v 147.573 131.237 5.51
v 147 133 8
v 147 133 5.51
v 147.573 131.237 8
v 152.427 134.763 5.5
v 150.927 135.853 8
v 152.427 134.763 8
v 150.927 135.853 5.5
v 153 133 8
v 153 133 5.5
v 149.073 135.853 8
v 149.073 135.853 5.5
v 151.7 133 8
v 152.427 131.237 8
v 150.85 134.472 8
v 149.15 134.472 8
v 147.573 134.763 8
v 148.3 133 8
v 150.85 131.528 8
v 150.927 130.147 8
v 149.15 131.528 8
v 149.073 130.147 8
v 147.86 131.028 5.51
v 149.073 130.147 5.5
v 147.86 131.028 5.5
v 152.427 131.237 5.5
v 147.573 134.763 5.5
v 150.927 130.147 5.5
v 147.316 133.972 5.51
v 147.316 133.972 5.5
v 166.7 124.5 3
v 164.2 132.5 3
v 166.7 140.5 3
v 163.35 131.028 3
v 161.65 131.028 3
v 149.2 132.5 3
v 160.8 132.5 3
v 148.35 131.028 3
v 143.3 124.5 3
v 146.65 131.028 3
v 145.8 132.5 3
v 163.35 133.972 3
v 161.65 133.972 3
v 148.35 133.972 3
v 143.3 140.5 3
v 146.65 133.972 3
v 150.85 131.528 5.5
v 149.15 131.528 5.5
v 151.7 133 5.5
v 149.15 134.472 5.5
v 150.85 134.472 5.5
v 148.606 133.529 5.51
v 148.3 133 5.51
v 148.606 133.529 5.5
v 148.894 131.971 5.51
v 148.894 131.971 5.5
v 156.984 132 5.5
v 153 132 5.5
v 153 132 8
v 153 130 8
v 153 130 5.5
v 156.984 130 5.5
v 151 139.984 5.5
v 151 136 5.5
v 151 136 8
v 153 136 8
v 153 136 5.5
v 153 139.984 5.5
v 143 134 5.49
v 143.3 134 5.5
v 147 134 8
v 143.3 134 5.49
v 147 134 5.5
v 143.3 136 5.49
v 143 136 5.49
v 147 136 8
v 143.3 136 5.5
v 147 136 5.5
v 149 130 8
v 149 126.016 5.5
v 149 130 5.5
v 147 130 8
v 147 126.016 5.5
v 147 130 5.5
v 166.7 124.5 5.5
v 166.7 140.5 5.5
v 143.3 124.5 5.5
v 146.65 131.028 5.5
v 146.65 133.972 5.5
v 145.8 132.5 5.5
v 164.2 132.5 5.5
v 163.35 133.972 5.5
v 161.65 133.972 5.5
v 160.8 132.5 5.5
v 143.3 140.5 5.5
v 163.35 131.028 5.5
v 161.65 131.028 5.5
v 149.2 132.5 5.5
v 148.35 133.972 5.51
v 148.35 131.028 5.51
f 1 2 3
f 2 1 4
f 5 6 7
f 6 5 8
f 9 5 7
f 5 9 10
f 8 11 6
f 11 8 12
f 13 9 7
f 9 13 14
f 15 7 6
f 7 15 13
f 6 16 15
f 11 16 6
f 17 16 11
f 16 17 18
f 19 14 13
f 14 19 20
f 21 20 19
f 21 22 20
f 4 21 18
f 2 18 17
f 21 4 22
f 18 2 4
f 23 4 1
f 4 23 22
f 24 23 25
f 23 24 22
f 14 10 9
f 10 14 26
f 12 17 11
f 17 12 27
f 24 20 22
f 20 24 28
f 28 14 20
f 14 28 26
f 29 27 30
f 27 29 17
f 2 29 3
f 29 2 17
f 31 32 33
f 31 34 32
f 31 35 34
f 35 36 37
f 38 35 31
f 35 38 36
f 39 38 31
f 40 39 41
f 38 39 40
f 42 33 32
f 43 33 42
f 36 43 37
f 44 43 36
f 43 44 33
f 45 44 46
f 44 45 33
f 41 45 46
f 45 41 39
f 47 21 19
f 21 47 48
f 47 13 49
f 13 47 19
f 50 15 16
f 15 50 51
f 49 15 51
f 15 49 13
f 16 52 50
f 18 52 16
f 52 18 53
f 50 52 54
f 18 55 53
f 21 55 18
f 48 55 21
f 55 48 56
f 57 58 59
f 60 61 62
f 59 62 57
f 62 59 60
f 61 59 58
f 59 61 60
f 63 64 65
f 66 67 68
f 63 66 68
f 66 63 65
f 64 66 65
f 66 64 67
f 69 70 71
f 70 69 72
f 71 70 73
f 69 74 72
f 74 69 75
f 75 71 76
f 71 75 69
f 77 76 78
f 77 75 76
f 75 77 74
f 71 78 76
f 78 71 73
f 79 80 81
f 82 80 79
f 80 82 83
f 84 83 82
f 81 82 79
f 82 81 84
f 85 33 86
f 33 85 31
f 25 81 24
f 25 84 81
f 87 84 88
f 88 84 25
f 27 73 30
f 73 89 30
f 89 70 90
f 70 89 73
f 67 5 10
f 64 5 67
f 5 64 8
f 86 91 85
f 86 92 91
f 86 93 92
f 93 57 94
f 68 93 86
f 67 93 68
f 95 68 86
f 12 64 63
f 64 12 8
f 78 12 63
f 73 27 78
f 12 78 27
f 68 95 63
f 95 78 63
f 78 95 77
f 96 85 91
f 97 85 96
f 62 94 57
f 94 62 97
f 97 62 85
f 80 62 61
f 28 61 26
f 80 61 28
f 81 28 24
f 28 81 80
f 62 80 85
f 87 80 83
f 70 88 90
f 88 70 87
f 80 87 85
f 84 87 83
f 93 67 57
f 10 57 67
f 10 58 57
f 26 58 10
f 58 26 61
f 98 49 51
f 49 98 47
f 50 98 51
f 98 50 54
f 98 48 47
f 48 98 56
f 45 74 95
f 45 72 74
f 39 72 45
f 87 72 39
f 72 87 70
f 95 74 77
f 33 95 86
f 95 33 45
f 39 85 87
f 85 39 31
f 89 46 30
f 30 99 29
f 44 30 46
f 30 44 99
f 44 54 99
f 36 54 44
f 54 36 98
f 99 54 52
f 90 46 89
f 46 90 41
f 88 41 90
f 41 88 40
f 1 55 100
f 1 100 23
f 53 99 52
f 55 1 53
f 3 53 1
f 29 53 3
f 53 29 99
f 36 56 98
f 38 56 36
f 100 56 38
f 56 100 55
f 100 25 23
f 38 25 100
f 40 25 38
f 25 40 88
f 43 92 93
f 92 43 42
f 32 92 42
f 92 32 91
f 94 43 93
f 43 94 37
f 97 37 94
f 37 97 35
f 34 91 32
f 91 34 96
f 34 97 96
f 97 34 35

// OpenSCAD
// =====================================================================
// parts/m2_retainer.scad  ->  m2_retainer()
//
// Gusseted M2.5 retainer post that supplies the MISSING M.2 standoff for
// the Dell Inspiron 15-5558/5559 board (the board's far M.2 mounting hole
// has no factory standoff on this chassis floor). It bolts onto the common
// 15mm M3 heat-set grid on baseplate_rear and presents an upward-opening
// M2.5 insert at the board plane so the M.2 SSD screws down into it.
//
// FROZEN CONTRACT — modeled in the GLOBAL ASSEMBLY FRAME:
//   Origin (0,0,0) = front-bottom-left interior corner of the chassis body.
//   +X width, +Y depth, +Z height (floor 0..FLOOR=3, board underside Z=8).
// main.scad unions this module with NO transform, so it is PRE-PLACED here
// at M2_RETAINER_POS and rests on the baseplate floor top (Z = FLOOR).
//
// Placement / sizing (all from params.scad):
//   - Foot footprint  M2_FOOT = [16,16] (X,Y), centered on M2_RETAINER_POS.
//   - Base sits on the floor top at Z = FLOOR (3). The retainer is a SEPARATE
//     printed piece that bolts down onto the grid bosses below it.
//   - M2.5 post rises M2_POST_H (=STANDOFF_H=5) from the floor top to the
//     board plane Z = FLOOR + M2_POST_H = 8, with an M2.5 heat-set insert
//     bore opening UPWARD (no bridging).
//   - Foot carries 2x M3 CLEARANCE through-holes on the nearest 15mm grid
//     points so M3 screws pass through into the baseplate grid inserts.
//   - Diagonal gussets brace the side-loaded post (45deg faces, print-flat,
//     zero supports).
//
// Printability: flat largest-face-down (foot on bed), no overhang >45deg,
// the only bore opens upward. // MEASURE values live ONLY in params.scad.
// =====================================================================

include <params.scad>
use <../lib/joinery.scad>

module m2_retainer() {
    // ---- resolved placement (assembly frame) ----
    cx     = M2_RETAINER_POS[0];          // post center X  (~150) // MEASURE
    cy     = M2_RETAINER_POS[1];          // post center Y  (~133) // MEASURE
    fw     = M2_FOOT[0];                  // foot X extent (16)
    fd     = M2_FOOT[1];                  // foot Y extent (16)
    z0     = FLOOR;                       // base sits on floor top  (Z=3)
    z_top  = FLOOR + M2_POST_H;           // post top = board plane  (Z=8)

    // foot slab: keep thin enough for clean M3 through-holes, thick enough
    // to seat the screw heads / spread load. Stops short of the board plane.
    foot_h = 2.5;                         // foot slab thickness (Z)
    post_h = z_top - z0;                  // M2.5 post height (= M2_POST_H = 5)

    // ---- 2x M3 clearance holes on the nearest 15mm grid points ----------
    // Grid points: X = GRID_X0 + n*GRID_PITCH, Y = GRID_Y0 + m*GRID_PITCH.
    // Pick the two grid columns straddling the post X, on the grid row
    // nearest the post Y, so both screws land on REAL grid bosses 15mm apart.
    gx_lo = GRID_X0 + GRID_PITCH * floor((cx - GRID_X0) / GRID_PITCH); // 147.5
    gx_hi = gx_lo + GRID_PITCH;                                        // 162.5
    gy    = GRID_Y0 + GRID_PITCH * round((cy - GRID_Y0) / GRID_PITCH); // 132.5
    bolt_pts = [ [gx_lo, gy], [gx_hi, gy] ];   // 2x M3 clearance // MEASURE

    // Foot footprint: the contract's nominal M2_FOOT is [16,16], but two
    // grid bolts sit 15mm apart (GRID_PITCH), so a strict 16mm foot leaves no
    // wall around the outer hole. Size the foot to ENVELOPE both holes plus an
    // M3 edge margin (X), keep the nominal depth (Y), and center it on the
    // bolt span / row. The post stays exactly on M2_RETAINER_POS so it still
    // mates with the board's M.2 hole. Two largest axes stay << 190 (bed OK).
    hole_margin = M3_CLEAR/2 + 2.5;       // wall around an M3 clearance hole
    fw_used = max(fw, (gx_hi - gx_lo) + 2*hole_margin);  // ~19.9mm in X
    fd_used = fd;                                         // 16mm in Y (nominal)
    fcx = (gx_lo + gx_hi) / 2;             // foot center X = bolt-span midpoint
    fcy = gy;                              // foot center Y = bolt row
    fx0 = fcx - fw_used/2;                 // foot X0
    fy0 = fcy - fd_used/2;                 // foot Y0

    difference() {
        union() {
            // ---- foot slab (flat-bottom on floor top) -------------------
            translate([fx0, fy0, z0])
                cube([fw_used, fd_used, foot_h]);

            // ---- M2.5 post (heat-set boss, bore opens upward) -----------
            // m25_standoff bases at Z=0 with an upward bore + base fillet;
            // lift it to the foot base so it spans z0..z_top.
            translate([cx, cy, z0])
                m25_standoff(post_h, M25_BOSS_OD, M25_INSERT_BORE,
                             M25_INSERT_DEPTH, fillet = 1.5, EPS);

            // ---- 4 diagonal gussets bracing the post (print-flat) -------
            // Each gusset is a right-triangle web rooted on the post wall and
            // ramping down to the foot top; its only downward face is the flat
            // bottom on the foot, so it prints with zero support. The reach is
            // bounded by the nearest foot edge from the (off-center) post.
            gus_t   = 2;                          // gusset web thickness
            gus_run = min(fcx - fx0, fx0 + fw_used - fcx,
                          fcy - fy0, fy0 + fd_used - fcy) - M25_BOSS_OD/2 - 1;
            for (a = [0, 90, 180, 270])
                translate([cx, cy, z0 + foot_h - EPS])
                    rotate([0, 0, a])
                        gusset(M25_BOSS_OD/2, gus_run, post_h - foot_h + EPS, gus_t);
        }

        // ---- 2x M3 clearance through-holes ------------------------------
        for (p = bolt_pts)
            translate([p[0], p[1], z0 - EPS])
                cylinder(h = foot_h + 2*EPS, d = M3_CLEAR);
    }
}

// Right-triangle gusset web in the X-Z plane: stands on the foot top (its
// own Z=0), rooted at the post wall (local X = inner), extends outward +X by
// `run`, rises +Z by `rise`. The hypotenuse runs from the outer foot corner
// up to the post-wall apex, so its overhang face is <=45deg when run>=rise
// (printable, zero support). Web thickness `t` centered on the Y axis.
module gusset(inner, run, rise, t) {
    // build the triangle in X-Z (polygon is X-Y), then stand it up about X.
    translate([0, -t/2, 0])
        rotate([90, 0, 0])                // X-Y polygon -> X-Z web plane
            linear_extrude(height = t)
                polygon(points = [
                    [inner,        0],     // root at post wall, on the foot
                    [inner + run,  0],     // outer reach, on the foot
                    [inner,        rise]   // apex up the post wall
                ]);
}

// standalone render
m2_retainer();
